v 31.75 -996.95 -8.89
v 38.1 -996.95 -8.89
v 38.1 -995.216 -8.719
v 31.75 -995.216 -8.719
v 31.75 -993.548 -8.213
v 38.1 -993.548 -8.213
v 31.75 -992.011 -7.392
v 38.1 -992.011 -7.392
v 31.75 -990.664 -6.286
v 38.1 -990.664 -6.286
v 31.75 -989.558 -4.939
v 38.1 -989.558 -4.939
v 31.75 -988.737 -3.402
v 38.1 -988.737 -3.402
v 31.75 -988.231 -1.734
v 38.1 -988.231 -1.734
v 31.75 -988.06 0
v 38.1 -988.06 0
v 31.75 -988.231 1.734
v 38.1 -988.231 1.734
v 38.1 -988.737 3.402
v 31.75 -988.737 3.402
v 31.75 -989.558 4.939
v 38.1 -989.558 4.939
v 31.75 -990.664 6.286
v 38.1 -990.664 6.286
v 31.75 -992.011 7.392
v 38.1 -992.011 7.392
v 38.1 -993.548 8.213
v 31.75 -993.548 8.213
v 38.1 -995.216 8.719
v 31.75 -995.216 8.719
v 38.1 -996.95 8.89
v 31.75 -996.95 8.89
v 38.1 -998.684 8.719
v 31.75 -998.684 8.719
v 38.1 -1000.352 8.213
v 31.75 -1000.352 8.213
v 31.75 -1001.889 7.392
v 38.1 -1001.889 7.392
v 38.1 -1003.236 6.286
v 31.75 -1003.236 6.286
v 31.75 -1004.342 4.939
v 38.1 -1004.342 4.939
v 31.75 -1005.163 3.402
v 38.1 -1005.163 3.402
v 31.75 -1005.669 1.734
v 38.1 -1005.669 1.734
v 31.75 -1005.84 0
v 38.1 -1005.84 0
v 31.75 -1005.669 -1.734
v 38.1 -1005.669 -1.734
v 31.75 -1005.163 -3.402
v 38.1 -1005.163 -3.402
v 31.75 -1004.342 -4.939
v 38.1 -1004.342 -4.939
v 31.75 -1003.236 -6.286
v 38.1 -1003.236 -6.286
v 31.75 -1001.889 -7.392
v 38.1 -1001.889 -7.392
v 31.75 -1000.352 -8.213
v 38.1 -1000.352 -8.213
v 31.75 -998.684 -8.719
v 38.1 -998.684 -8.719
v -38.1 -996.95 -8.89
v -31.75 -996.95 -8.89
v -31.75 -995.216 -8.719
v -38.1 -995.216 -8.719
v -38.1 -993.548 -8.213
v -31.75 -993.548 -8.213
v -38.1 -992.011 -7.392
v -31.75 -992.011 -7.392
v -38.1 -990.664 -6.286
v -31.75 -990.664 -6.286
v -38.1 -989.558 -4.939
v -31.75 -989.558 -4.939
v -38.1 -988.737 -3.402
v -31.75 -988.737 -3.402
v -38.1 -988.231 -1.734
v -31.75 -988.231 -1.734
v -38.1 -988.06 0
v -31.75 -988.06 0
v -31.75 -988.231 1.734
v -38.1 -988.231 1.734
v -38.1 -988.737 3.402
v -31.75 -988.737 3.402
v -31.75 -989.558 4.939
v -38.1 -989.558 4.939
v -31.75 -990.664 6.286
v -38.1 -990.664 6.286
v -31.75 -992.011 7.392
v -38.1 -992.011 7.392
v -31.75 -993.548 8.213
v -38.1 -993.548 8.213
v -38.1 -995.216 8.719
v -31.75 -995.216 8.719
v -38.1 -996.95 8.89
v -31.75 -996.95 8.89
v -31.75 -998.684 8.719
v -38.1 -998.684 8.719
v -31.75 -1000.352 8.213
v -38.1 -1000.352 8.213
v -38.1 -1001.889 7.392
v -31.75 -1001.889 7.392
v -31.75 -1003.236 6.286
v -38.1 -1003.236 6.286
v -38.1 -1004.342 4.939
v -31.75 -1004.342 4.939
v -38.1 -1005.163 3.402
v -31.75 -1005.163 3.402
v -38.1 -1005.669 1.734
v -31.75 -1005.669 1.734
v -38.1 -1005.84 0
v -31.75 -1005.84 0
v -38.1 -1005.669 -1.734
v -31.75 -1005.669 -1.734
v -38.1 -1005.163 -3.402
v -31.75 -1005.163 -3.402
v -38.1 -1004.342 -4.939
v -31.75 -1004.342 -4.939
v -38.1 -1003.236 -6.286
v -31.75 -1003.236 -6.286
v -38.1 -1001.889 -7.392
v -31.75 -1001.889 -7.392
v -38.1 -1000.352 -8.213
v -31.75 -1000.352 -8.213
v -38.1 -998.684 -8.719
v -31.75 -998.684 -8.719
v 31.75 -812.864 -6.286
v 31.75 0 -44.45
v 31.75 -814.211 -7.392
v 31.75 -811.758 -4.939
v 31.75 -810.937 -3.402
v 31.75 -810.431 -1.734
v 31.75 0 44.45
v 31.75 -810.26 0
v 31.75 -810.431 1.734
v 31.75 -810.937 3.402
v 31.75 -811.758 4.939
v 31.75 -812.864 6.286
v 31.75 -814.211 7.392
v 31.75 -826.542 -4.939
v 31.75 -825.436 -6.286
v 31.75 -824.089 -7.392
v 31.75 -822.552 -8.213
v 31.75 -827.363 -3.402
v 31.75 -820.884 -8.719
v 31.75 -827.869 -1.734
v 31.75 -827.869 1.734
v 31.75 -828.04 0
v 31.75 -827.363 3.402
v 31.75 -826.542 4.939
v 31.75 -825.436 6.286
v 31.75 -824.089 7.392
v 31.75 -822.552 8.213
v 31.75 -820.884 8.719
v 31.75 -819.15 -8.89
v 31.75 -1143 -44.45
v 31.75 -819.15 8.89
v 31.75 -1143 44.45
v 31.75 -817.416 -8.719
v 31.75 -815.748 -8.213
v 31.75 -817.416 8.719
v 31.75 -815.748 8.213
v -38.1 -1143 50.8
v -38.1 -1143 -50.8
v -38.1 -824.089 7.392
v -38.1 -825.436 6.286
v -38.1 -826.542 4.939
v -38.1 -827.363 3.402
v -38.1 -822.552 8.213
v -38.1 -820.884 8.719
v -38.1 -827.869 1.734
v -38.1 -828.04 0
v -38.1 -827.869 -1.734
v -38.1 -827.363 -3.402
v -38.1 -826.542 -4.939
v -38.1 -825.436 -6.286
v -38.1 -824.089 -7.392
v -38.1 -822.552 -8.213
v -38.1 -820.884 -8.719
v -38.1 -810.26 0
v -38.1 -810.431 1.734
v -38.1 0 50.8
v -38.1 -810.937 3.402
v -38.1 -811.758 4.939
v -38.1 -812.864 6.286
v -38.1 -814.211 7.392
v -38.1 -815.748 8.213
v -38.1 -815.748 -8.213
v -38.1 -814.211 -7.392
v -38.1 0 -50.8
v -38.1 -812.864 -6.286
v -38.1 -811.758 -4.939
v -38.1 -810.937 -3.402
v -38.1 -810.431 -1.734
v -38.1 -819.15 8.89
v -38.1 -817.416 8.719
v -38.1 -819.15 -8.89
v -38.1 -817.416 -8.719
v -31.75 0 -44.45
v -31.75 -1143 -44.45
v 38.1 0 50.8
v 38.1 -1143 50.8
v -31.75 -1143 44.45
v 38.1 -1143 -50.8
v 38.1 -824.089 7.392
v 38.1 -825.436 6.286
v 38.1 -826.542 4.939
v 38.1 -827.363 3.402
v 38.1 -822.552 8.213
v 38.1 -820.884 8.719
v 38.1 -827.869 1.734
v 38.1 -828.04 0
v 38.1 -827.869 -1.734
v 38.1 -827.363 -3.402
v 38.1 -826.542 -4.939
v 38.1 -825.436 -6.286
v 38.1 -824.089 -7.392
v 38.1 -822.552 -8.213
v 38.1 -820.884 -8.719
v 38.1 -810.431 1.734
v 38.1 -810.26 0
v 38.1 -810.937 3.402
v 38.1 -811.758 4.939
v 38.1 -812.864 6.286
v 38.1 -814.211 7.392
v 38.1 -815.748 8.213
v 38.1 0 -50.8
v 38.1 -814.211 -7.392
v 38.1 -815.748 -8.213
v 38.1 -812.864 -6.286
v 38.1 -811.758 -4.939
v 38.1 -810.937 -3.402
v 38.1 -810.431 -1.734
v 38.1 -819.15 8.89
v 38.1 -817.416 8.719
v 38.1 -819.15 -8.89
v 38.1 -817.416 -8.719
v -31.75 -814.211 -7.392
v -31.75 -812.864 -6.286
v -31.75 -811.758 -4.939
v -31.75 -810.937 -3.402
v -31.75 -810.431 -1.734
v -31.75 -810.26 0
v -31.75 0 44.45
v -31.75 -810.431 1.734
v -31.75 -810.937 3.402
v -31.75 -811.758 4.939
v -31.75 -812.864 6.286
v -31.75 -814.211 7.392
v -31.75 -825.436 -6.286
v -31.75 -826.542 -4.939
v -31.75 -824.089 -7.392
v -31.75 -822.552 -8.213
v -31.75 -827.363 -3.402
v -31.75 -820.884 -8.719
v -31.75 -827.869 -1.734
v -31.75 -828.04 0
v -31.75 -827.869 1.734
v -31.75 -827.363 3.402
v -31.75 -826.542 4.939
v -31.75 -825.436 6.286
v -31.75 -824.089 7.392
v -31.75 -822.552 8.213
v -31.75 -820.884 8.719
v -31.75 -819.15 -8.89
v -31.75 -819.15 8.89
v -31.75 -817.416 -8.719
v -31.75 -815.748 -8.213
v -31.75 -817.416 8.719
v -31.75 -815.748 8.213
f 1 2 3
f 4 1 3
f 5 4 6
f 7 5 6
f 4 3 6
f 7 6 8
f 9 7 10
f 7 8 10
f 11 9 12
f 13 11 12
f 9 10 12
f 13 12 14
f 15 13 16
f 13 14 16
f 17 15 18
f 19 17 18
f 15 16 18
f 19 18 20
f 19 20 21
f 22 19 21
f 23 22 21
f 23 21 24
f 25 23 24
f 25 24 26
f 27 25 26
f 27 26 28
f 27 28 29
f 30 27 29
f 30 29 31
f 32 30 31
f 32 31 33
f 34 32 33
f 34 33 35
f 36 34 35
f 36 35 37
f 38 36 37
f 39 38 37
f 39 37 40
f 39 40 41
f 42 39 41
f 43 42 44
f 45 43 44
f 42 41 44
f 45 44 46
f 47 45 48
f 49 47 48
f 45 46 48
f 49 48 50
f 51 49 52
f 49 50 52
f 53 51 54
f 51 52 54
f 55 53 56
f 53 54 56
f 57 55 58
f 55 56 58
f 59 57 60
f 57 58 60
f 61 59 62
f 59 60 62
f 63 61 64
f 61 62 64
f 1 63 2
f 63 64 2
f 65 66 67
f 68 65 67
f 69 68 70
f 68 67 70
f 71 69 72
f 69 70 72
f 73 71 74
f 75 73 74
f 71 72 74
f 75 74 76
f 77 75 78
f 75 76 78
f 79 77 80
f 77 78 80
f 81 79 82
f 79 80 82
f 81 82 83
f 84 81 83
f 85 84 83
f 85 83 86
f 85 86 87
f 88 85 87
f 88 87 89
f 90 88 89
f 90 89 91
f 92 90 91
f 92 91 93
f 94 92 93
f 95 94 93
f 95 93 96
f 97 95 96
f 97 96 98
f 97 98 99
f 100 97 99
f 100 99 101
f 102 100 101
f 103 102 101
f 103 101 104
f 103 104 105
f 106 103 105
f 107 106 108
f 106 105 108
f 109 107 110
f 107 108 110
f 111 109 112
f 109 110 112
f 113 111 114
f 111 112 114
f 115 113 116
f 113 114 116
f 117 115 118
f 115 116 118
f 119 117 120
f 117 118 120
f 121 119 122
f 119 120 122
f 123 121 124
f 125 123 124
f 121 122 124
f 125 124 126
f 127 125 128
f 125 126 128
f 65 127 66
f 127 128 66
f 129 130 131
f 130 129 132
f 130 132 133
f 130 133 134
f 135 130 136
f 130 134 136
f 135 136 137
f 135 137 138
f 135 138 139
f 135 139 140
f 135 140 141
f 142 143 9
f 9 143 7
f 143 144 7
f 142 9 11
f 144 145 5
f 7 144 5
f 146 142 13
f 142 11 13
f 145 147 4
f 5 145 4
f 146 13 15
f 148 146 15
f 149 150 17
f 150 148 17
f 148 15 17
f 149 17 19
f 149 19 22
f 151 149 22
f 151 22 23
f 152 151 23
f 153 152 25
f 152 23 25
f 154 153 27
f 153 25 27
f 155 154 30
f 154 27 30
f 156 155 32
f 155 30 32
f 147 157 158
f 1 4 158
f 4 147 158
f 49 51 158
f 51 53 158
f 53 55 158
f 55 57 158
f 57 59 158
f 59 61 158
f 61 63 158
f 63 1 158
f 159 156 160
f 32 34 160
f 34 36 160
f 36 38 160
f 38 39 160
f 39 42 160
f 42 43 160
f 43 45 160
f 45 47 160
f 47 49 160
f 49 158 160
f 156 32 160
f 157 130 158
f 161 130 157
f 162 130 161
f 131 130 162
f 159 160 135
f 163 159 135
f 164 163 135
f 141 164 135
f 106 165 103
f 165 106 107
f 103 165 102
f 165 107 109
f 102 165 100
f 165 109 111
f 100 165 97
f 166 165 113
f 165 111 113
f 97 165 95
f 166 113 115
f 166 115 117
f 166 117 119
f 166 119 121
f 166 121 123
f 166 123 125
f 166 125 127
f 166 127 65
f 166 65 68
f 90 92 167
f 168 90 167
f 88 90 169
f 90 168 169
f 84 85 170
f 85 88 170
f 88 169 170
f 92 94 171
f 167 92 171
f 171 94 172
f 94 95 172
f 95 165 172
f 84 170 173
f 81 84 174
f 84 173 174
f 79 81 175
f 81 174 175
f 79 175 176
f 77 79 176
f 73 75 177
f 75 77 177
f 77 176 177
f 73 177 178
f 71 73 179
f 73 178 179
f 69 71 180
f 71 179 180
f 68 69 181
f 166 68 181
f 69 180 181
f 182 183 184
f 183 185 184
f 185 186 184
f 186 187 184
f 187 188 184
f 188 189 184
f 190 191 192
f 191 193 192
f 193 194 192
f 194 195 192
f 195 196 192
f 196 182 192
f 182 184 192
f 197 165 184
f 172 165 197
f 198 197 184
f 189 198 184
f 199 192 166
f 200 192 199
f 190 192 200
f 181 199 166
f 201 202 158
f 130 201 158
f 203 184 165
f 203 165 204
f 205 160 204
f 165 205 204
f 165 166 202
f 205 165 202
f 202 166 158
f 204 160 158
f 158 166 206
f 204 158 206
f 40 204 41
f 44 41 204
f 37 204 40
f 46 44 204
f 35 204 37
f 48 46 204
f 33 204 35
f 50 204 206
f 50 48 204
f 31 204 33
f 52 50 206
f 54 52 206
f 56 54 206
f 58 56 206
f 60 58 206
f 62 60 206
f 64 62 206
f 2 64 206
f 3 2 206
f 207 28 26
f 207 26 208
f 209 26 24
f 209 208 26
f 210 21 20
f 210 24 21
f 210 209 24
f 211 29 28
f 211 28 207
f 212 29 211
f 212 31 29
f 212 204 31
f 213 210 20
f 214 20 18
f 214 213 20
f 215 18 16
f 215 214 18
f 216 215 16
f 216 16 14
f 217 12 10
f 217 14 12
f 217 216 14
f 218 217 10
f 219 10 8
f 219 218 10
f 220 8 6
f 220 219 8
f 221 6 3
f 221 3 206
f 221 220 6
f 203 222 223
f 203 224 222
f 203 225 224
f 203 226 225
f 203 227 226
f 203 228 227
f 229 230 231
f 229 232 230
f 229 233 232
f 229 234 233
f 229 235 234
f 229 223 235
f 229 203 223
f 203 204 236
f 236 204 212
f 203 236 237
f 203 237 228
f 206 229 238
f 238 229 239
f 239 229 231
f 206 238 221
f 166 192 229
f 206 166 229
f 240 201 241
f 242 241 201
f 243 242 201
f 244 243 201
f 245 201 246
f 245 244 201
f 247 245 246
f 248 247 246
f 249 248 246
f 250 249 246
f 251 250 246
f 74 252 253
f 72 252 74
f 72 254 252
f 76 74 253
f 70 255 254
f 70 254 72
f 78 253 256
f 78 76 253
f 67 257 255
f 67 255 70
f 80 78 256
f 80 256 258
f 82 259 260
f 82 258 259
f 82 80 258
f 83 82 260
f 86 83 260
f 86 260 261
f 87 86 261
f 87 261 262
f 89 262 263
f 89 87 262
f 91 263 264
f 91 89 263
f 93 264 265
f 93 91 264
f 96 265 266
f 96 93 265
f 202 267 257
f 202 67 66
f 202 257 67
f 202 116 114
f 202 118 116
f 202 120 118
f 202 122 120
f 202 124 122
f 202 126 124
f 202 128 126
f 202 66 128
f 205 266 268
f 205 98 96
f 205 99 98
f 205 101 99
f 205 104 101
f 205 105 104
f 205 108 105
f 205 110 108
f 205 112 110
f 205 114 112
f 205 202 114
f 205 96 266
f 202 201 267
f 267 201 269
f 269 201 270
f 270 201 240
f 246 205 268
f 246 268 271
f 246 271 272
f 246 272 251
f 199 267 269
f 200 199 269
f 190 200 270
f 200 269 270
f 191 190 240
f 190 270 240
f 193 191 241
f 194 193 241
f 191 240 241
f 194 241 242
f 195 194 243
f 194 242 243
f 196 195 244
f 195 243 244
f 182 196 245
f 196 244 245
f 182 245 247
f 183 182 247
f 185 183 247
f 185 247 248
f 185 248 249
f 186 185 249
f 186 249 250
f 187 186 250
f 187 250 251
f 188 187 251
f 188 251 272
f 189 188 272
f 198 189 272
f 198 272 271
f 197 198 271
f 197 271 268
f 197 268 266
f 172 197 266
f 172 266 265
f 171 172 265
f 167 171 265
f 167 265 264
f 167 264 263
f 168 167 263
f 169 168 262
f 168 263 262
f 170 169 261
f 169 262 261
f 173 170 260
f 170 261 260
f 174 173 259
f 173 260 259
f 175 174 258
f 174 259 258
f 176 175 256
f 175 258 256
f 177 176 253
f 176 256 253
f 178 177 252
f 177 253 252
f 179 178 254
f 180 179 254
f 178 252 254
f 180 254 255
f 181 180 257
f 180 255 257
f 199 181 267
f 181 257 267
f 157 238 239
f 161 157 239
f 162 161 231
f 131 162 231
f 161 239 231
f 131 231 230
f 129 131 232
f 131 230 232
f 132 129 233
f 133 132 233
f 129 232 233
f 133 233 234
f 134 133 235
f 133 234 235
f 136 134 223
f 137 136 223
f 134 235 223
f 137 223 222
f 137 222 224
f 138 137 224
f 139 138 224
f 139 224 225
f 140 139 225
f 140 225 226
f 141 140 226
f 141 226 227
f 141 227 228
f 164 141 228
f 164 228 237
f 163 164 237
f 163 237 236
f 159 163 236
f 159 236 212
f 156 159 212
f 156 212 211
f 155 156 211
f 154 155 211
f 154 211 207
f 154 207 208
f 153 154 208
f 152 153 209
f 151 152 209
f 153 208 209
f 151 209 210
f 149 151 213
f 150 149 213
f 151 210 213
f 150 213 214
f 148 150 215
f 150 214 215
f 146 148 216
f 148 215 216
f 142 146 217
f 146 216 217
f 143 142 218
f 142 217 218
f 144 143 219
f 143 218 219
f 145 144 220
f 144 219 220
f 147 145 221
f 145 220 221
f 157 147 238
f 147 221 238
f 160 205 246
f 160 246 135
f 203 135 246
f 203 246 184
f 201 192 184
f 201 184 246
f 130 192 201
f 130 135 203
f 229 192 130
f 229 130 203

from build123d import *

# Parameters (mm, degrees)
SKETCH1_W           = 76.2
SKETCH1_H           = 101.6
BOSS_EXTRUDE1_DEPTH = 1143
SKETCH2_W           = 63.5
SKETCH2_H           = 88.9
CUT_EXTRUDE1_DEPTH  = 1145.76252996
SKETCH3_R           = 8.89
CUT_EXTRUDE2_DEPTH  = 1147.663019374


with BuildPart() as part:
    # Sketch1 → Boss-Extrude1 (new body)
    with BuildSketch(Plane(origin=(0, 0, 0), x_dir=(1, 0, 0), z_dir=(0, 1, 0))):
        Rectangle(SKETCH1_W, SKETCH1_H)
    extrude(amount=-BOSS_EXTRUDE1_DEPTH)

    # Sketch2 → Cut-Extrude1 (cut, through all)
    with BuildSketch(Plane.XZ.offset(1143)):
        Rectangle(SKETCH2_W, SKETCH2_H)
    extrude(amount=-CUT_EXTRUDE1_DEPTH, mode=Mode.SUBTRACT)

    # Sketch3 → Cut-Extrude2 (cut, through all)
    with BuildSketch(Plane(origin=(38.1, 0, 0), x_dir=(0, 0, -1), z_dir=(1, 0, 0))):
        with Locations((0, -996.95)):
            Circle(SKETCH3_R)
        with Locations((0, -819.15)):
            Circle(SKETCH3_R)
    extrude(amount=-CUT_EXTRUDE2_DEPTH, mode=Mode.SUBTRACT)


solid = part.part
